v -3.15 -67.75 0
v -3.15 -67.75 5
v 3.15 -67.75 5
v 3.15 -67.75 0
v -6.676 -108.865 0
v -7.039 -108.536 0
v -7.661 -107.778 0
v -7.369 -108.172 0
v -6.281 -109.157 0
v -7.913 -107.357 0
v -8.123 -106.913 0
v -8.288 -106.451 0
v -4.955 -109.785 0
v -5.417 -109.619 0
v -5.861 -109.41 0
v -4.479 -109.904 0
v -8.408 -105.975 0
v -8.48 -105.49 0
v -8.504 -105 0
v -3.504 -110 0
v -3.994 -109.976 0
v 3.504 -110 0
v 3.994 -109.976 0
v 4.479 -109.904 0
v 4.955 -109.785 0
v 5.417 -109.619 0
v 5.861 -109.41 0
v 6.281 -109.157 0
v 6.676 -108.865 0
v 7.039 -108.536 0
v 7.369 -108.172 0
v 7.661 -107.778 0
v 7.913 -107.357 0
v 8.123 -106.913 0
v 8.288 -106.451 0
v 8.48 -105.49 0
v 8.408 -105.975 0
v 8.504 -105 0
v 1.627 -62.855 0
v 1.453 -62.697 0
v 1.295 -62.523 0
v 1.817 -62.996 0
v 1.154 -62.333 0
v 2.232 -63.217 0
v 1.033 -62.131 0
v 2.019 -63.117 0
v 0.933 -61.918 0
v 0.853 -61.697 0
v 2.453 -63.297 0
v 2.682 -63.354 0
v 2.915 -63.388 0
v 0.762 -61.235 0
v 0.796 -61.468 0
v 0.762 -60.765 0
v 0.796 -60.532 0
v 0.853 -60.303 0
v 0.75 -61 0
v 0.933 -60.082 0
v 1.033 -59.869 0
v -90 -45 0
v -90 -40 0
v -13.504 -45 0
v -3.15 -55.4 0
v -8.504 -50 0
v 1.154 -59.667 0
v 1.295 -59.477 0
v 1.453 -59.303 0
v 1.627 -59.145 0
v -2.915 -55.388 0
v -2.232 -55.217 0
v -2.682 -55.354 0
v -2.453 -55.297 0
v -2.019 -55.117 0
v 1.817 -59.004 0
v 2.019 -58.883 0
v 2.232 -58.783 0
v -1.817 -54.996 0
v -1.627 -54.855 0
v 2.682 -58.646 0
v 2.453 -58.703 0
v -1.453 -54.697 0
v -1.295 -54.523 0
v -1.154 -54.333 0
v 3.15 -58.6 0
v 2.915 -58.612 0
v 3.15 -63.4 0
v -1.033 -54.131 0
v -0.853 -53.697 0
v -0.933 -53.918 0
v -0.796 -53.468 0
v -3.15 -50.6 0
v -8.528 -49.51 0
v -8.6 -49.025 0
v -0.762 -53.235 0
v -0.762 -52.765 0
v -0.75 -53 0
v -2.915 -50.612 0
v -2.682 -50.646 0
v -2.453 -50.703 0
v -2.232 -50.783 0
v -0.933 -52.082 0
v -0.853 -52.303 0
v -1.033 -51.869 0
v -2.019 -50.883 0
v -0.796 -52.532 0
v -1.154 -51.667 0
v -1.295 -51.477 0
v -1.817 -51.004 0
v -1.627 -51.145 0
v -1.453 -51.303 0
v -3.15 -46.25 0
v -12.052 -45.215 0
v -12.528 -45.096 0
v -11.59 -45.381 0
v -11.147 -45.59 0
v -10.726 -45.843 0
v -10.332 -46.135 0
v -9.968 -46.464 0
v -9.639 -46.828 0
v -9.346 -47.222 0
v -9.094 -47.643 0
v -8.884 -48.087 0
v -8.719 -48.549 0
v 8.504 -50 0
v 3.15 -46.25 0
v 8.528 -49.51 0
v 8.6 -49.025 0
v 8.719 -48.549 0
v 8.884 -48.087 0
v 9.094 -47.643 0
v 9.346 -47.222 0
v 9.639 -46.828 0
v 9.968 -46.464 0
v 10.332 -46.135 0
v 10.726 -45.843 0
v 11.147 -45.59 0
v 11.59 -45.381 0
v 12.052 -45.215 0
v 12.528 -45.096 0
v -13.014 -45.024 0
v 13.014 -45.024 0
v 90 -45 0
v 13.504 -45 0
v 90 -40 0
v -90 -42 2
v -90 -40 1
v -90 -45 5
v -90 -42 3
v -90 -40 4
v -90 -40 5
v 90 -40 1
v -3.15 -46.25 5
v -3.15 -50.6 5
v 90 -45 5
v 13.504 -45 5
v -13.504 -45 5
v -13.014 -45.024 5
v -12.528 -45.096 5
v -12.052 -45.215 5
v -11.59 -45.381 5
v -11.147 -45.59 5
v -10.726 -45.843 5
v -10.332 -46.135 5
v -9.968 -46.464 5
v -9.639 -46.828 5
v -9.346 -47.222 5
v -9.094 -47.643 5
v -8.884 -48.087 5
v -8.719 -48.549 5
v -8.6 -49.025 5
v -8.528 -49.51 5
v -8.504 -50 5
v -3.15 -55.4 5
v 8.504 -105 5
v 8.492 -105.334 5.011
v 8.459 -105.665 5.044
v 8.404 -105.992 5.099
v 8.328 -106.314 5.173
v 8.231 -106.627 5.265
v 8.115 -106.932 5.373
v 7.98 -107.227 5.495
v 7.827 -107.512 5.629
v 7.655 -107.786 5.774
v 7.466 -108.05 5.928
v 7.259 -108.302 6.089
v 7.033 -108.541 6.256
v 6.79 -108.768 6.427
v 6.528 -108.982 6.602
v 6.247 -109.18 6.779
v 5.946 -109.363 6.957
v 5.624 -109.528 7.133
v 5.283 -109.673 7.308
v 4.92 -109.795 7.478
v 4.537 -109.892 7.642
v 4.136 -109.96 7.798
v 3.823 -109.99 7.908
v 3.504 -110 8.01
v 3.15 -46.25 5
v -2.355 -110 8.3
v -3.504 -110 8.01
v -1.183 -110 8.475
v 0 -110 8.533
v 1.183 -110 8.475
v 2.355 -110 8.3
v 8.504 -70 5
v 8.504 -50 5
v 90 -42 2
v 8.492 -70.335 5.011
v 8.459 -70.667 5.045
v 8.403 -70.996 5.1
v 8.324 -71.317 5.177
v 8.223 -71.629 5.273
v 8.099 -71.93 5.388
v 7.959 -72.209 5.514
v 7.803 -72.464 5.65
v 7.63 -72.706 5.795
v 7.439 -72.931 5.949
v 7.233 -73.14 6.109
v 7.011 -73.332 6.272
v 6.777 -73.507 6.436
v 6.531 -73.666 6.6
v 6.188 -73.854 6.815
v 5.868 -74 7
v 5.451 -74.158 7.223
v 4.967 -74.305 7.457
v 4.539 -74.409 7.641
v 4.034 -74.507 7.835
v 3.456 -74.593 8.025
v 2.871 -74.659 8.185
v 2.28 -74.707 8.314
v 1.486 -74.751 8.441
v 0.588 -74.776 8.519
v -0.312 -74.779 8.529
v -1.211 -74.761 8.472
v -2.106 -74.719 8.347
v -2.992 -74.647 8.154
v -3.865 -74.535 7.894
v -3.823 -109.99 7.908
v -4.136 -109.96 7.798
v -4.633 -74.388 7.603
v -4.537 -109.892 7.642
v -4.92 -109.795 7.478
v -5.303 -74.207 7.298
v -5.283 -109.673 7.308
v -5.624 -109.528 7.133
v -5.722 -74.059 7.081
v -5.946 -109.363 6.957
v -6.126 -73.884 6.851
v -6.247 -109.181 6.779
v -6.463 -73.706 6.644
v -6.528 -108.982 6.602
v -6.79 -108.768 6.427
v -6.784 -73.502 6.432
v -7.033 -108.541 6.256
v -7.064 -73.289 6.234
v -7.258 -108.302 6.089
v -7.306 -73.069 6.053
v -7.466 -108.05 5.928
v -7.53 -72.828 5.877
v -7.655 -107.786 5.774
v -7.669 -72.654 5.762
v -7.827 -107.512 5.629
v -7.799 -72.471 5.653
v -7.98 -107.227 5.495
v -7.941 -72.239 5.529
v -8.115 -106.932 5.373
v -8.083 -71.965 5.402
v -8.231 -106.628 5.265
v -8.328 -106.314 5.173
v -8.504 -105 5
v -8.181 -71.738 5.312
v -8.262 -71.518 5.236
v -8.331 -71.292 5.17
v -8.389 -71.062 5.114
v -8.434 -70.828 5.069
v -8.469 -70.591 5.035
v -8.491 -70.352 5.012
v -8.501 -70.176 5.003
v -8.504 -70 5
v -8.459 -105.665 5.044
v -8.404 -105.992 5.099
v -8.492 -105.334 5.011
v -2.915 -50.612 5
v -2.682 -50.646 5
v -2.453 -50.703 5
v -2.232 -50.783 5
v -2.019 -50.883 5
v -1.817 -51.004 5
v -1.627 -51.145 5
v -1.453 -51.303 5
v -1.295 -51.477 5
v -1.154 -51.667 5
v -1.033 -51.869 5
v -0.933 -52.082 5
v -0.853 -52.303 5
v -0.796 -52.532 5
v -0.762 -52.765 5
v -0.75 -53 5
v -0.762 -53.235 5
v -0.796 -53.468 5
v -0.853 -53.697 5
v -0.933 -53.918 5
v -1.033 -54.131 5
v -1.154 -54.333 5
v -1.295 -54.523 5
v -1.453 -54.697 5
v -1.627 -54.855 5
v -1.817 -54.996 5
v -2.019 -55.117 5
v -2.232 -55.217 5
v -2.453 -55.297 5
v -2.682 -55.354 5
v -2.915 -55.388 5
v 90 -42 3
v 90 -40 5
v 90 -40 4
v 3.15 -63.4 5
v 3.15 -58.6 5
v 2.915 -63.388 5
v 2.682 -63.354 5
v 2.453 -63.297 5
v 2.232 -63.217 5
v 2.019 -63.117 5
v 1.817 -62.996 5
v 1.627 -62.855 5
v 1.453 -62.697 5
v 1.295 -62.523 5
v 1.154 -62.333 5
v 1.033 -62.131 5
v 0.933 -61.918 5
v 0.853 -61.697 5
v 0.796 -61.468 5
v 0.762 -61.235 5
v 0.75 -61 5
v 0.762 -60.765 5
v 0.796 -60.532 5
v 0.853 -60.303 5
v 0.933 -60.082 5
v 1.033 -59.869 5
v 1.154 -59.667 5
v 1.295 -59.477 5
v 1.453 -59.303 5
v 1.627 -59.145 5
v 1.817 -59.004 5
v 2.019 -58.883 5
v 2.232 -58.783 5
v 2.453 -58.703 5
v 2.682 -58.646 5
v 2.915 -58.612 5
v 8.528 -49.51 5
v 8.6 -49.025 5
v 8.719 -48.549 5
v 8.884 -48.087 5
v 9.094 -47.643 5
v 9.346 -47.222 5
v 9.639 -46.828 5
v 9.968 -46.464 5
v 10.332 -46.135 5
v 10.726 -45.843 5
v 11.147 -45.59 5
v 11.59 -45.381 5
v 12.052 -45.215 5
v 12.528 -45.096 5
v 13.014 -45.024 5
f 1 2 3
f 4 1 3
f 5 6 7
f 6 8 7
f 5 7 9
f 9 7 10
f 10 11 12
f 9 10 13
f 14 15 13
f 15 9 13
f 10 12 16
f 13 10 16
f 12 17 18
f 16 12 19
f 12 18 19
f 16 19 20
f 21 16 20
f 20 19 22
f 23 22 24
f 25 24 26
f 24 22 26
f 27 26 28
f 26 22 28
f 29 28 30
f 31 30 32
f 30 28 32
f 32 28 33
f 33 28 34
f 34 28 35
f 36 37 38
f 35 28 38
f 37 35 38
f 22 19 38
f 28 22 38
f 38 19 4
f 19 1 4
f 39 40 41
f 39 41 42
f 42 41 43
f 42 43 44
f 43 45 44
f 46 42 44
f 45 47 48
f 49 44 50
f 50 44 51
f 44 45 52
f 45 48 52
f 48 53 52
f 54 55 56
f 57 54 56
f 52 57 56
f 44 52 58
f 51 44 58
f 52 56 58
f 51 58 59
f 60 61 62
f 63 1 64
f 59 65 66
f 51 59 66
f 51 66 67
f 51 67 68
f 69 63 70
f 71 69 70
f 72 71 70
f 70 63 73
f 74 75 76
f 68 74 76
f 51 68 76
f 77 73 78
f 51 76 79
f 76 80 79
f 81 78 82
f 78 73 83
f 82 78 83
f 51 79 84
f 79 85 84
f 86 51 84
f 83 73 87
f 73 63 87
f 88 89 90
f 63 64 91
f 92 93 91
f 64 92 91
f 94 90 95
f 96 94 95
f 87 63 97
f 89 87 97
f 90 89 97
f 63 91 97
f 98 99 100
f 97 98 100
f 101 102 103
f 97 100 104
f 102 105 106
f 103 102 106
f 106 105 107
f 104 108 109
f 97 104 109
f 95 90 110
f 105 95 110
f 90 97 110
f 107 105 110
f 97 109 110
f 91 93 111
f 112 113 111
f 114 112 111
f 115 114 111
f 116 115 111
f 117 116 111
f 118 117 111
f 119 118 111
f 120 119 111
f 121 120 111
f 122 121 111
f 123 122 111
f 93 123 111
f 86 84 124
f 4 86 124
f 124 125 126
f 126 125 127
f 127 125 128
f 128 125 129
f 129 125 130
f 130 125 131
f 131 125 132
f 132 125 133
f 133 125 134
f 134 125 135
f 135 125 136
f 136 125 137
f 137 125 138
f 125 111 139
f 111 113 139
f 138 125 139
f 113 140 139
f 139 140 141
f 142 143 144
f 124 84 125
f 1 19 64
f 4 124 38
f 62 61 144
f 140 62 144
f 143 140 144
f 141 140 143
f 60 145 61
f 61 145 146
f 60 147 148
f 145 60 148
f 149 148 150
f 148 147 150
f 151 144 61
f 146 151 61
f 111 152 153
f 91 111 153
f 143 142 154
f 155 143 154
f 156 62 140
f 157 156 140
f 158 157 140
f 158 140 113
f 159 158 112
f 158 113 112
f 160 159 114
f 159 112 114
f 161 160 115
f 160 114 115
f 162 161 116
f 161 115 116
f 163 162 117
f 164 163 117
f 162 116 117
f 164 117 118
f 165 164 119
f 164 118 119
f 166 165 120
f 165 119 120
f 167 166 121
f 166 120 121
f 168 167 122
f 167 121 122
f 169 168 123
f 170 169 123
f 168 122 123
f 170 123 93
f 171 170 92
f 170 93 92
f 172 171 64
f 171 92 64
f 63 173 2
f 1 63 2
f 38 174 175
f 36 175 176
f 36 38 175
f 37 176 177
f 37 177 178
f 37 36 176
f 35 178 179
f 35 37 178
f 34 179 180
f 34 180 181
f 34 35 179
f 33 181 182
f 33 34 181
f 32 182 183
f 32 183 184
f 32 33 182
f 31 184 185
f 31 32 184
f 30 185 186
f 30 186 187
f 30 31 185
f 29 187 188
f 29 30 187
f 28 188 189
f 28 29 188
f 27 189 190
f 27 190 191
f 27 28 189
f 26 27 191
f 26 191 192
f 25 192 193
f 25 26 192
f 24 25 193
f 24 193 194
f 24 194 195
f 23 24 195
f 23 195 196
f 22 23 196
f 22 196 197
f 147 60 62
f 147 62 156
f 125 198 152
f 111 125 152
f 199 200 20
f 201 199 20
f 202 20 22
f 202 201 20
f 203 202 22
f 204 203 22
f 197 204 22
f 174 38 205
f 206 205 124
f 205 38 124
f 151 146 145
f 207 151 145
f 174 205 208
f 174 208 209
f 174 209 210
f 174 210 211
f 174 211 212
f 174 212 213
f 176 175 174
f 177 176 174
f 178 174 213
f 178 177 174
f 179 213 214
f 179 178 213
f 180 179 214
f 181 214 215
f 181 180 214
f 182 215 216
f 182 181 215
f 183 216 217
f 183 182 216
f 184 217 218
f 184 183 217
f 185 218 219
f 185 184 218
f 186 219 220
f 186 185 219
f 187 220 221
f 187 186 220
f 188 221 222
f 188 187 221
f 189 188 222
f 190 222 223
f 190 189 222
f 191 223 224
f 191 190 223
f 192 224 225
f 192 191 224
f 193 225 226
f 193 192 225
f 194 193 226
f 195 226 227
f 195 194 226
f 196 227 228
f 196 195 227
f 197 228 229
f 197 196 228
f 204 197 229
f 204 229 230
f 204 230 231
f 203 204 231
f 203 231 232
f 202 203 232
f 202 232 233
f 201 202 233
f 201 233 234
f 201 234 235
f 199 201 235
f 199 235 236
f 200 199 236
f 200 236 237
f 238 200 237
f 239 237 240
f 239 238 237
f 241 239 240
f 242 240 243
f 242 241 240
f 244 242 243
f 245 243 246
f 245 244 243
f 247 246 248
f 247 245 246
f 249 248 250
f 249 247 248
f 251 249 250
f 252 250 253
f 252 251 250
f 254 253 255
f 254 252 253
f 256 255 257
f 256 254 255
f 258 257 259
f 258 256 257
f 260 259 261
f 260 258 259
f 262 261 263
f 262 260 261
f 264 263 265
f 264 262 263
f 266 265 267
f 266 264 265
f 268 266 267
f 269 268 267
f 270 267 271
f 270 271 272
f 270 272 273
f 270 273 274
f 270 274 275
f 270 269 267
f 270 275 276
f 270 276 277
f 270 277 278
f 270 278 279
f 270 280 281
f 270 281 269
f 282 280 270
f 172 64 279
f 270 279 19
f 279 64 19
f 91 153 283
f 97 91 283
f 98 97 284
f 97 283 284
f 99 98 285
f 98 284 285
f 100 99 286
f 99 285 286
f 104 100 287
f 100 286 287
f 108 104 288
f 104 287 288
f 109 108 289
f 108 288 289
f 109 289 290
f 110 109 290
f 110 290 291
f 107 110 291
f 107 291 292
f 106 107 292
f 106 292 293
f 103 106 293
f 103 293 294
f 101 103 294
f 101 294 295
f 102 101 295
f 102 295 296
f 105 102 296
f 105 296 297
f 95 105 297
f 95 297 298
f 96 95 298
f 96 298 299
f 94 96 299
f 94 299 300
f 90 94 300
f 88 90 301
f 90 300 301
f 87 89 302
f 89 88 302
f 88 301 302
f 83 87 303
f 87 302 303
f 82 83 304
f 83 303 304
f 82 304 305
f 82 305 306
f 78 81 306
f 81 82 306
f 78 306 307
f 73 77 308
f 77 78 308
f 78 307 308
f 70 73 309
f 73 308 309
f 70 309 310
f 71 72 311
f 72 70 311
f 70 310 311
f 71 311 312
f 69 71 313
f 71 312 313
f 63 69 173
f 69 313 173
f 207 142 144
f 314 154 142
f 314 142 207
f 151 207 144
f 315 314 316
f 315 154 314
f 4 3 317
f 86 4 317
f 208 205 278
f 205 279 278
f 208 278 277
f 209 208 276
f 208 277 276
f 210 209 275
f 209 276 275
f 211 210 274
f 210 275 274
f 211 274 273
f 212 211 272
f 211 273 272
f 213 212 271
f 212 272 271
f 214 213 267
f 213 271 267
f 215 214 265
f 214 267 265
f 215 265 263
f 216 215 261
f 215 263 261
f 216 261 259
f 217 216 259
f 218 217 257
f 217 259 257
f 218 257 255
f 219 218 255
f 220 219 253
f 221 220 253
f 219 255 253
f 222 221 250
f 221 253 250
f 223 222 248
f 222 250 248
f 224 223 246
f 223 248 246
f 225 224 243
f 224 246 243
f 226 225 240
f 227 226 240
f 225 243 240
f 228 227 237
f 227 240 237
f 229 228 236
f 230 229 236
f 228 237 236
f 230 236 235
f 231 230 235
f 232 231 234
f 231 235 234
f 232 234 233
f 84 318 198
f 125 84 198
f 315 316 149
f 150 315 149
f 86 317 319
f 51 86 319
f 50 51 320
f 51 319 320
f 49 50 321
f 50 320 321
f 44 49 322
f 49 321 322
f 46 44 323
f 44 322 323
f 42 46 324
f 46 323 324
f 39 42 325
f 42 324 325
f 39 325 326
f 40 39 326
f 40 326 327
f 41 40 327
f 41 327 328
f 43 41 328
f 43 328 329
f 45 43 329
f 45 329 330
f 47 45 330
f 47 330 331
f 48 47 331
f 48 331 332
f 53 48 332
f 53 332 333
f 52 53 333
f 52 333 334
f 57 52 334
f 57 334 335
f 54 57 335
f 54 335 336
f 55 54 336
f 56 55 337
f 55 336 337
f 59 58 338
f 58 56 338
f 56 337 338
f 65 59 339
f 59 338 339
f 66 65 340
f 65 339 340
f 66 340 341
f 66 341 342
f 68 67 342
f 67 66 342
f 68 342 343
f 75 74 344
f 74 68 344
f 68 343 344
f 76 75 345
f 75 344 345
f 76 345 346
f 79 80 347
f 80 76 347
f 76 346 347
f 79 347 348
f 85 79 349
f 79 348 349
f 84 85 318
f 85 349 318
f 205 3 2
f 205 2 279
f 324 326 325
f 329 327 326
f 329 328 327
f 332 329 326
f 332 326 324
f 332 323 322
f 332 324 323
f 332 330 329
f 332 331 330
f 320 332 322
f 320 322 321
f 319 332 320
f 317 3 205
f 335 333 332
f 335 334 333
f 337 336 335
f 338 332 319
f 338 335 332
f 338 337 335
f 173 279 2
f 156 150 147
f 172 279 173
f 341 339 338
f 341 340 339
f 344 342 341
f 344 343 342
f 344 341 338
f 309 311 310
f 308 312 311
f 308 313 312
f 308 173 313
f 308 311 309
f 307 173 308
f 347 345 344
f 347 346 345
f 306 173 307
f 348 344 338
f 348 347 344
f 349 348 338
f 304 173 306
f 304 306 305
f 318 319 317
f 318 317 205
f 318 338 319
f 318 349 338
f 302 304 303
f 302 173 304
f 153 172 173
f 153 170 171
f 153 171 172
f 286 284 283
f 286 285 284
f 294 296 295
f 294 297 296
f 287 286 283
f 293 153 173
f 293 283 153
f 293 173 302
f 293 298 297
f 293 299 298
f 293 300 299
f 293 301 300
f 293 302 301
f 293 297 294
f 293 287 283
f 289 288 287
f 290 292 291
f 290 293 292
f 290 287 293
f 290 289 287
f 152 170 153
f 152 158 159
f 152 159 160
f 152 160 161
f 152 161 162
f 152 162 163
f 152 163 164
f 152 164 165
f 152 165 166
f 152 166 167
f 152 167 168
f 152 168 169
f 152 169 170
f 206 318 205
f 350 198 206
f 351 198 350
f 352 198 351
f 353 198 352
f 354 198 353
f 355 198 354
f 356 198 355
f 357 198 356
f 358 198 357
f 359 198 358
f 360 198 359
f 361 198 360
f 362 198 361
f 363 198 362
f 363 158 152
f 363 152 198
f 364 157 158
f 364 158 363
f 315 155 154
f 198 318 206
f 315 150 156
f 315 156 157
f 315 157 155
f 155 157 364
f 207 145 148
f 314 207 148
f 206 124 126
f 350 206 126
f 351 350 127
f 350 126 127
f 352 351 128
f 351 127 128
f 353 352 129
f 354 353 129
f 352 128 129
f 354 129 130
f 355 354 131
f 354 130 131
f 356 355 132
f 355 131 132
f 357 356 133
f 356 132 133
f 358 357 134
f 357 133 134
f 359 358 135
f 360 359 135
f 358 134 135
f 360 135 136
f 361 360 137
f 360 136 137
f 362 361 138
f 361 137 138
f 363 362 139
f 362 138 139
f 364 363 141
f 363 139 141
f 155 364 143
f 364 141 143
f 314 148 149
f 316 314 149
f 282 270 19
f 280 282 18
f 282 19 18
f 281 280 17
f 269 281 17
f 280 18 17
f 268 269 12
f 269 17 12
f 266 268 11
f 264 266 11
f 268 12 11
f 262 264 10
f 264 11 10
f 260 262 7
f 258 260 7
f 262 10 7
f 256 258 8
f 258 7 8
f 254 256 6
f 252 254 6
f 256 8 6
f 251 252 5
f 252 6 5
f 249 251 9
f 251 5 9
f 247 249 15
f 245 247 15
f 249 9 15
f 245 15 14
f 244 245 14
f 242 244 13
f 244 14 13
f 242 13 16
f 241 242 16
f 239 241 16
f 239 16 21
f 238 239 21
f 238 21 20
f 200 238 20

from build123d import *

# Parameters (mm, degrees)
F1_DEPTH      = 5
F3_DEPTH      = 5.001
F5_DEPTH      = 35
F6_W          = 5
F6_H          = 5
F7_DEPTH      = 90
F7_DEPTH_BACK = 90
F9_DEPTH      = 180.001
F10_T1_DEPTH  = 5
F10_T6_DEPTH  = 17.0072864353
F10_S7_R      = 12
F10_T8_DEPTH  = 11
F10_T9_DEPTH  = 30


# Not quite as in the source:
# - a fillet or chamfer that OpenCascade refuses, or shapes differently, is made with other operations: its cross-section is extruded or revolved along the edge and cut away or added


with BuildPart() as f1:
    # F0 (on Top) → F1 (new body)
    with BuildSketch(Plane.XY):
        Polygon((8.5036432176, -40), (-8.5036432176, -40), (-8.5036432176, -110), (0, -110), (8.5036432176, -110), align=None)
    extrude(amount=F1_DEPTH)

    # F2 (on face) → F3 (cut, through all)
    with BuildSketch(Plane.XY.offset(5)):
        with BuildLine():
            Line((-3.15, -67.75), (3.15, -67.75))
            Line((3.15, -67.75), (3.15, -63.4))
            ThreePointArc((3.15, -63.4), (0.75, -61), (3.15, -58.6))
            Line((3.15, -58.6), (3.15, -46.25))
            Line((3.15, -46.25), (-3.15, -46.25))
            Line((-3.15, -46.25), (-3.15, -50.6))
            ThreePointArc((-3.15, -50.6), (-0.75, -53), (-3.15, -55.4))
            Line((-3.15, -55.4), (-3.15, -67.75))
        make_face()
    extrude(amount=-F3_DEPTH, mode=Mode.SUBTRACT)

    # F4 (on face) → F5 (join)
    with BuildSketch(Plane.XZ.offset(110)):
        with BuildLine():
            ThreePointArc((8.5036432176, 5), (0, 8.5331202898), (-8.5036432176, 5))
            Line((-8.5036432176, 5), (8.5036432176, 5))
        make_face()
    extrude(amount=-F5_DEPTH)

    # F6 (on Right) → F7 (join, two sides)
    with BuildSketch(Plane.YZ) as f7_sk:
        with Locations((-42.5, 2.5)):
            Rectangle(F6_W, F6_H)
    extrude(amount=F7_DEPTH)
    extrude(f7_sk.sketch, amount=-F7_DEPTH_BACK)

    # F8 (on face) → F9 (cut, through all)
    with BuildSketch(Plane(origin=(-90, 0, 0), x_dir=(0, -1, 0), z_dir=(-1, 0, 0))):
        Polygon((40, 1), (42, 2), (42, 3), (40, 4), align=None)
    extrude(amount=-F9_DEPTH, mode=Mode.SUBTRACT)

    # F10: fillet of radius 5 on 5 edges, made by hand

    # F10_s2 → F10_t1 (join)
    with BuildSketch(Plane.XY):
        with BuildLine():
            ThreePointArc((-13.5036432176, -45), (-9.9681093117, -46.4644660941), (-8.5036432176, -50))
            Line((-8.5036432176, -50), (-8.5036432176, -45))
            Line((-8.5036432176, -45), (-13.5036432176, -45))
        make_face()
        with BuildLine():
            ThreePointArc((8.5036432176, -50), (9.9681093117, -46.4644660941), (13.5036432176, -45))
            Line((13.5036432176, -45), (8.5036432176, -45))
            Line((8.5036432176, -45), (8.5036432176, -50))
        make_face()
    extrude(amount=F10_T1_DEPTH)


with BuildPart() as f10_tool4:
    # F10_s5 → F10_t6 (new body)
    with BuildSketch(Plane.YZ.offset(-8.5036432176)):
        with BuildLine():
            ThreePointArc((-70, 5), (-73.5355339059, 6.4644660941), (-75, 10))
            Line((-75, 10), (-75, 5))
            Line((-75, 5), (-70, 5))
        make_face()
    extrude(amount=F10_T6_DEPTH)

    # F10_s7 → F10_t8 (intersect, symmetric)
    with BuildSketch(Plane.XZ.offset(72.5)):
        with Locations((0, -3.4668797102)):
            Circle(F10_S7_R)
    extrude(amount=F10_T8_DEPTH, both=True, mode=Mode.INTERSECT)


with BuildPart() as f1_1:
    add(f1.part)

    # F10_t3: union F10_tool4
    add(f10_tool4.part)

    # F10_s10 → F10_t9 (cut)
    with BuildSketch(Plane.XY.offset(-12.5)):
        with BuildLine():
            ThreePointArc((-8.5036432176, -105), (-7.0391771236, -108.5355339059), (-3.5036432176, -110))
            Line((-3.5036432176, -110), (-8.5036432176, -110))
            Line((-8.5036432176, -110), (-8.5036432176, -105))
        make_face()
        with BuildLine():
            ThreePointArc((8.5036432176, -105), (7.0391771236, -108.5355339059), (3.5036432176, -110))
            Line((3.5036432176, -110), (8.5036432176, -110))
            Line((8.5036432176, -110), (8.5036432176, -105))
        make_face()
    extrude(amount=F10_T9_DEPTH, mode=Mode.SUBTRACT)


solid = f1_1.part
